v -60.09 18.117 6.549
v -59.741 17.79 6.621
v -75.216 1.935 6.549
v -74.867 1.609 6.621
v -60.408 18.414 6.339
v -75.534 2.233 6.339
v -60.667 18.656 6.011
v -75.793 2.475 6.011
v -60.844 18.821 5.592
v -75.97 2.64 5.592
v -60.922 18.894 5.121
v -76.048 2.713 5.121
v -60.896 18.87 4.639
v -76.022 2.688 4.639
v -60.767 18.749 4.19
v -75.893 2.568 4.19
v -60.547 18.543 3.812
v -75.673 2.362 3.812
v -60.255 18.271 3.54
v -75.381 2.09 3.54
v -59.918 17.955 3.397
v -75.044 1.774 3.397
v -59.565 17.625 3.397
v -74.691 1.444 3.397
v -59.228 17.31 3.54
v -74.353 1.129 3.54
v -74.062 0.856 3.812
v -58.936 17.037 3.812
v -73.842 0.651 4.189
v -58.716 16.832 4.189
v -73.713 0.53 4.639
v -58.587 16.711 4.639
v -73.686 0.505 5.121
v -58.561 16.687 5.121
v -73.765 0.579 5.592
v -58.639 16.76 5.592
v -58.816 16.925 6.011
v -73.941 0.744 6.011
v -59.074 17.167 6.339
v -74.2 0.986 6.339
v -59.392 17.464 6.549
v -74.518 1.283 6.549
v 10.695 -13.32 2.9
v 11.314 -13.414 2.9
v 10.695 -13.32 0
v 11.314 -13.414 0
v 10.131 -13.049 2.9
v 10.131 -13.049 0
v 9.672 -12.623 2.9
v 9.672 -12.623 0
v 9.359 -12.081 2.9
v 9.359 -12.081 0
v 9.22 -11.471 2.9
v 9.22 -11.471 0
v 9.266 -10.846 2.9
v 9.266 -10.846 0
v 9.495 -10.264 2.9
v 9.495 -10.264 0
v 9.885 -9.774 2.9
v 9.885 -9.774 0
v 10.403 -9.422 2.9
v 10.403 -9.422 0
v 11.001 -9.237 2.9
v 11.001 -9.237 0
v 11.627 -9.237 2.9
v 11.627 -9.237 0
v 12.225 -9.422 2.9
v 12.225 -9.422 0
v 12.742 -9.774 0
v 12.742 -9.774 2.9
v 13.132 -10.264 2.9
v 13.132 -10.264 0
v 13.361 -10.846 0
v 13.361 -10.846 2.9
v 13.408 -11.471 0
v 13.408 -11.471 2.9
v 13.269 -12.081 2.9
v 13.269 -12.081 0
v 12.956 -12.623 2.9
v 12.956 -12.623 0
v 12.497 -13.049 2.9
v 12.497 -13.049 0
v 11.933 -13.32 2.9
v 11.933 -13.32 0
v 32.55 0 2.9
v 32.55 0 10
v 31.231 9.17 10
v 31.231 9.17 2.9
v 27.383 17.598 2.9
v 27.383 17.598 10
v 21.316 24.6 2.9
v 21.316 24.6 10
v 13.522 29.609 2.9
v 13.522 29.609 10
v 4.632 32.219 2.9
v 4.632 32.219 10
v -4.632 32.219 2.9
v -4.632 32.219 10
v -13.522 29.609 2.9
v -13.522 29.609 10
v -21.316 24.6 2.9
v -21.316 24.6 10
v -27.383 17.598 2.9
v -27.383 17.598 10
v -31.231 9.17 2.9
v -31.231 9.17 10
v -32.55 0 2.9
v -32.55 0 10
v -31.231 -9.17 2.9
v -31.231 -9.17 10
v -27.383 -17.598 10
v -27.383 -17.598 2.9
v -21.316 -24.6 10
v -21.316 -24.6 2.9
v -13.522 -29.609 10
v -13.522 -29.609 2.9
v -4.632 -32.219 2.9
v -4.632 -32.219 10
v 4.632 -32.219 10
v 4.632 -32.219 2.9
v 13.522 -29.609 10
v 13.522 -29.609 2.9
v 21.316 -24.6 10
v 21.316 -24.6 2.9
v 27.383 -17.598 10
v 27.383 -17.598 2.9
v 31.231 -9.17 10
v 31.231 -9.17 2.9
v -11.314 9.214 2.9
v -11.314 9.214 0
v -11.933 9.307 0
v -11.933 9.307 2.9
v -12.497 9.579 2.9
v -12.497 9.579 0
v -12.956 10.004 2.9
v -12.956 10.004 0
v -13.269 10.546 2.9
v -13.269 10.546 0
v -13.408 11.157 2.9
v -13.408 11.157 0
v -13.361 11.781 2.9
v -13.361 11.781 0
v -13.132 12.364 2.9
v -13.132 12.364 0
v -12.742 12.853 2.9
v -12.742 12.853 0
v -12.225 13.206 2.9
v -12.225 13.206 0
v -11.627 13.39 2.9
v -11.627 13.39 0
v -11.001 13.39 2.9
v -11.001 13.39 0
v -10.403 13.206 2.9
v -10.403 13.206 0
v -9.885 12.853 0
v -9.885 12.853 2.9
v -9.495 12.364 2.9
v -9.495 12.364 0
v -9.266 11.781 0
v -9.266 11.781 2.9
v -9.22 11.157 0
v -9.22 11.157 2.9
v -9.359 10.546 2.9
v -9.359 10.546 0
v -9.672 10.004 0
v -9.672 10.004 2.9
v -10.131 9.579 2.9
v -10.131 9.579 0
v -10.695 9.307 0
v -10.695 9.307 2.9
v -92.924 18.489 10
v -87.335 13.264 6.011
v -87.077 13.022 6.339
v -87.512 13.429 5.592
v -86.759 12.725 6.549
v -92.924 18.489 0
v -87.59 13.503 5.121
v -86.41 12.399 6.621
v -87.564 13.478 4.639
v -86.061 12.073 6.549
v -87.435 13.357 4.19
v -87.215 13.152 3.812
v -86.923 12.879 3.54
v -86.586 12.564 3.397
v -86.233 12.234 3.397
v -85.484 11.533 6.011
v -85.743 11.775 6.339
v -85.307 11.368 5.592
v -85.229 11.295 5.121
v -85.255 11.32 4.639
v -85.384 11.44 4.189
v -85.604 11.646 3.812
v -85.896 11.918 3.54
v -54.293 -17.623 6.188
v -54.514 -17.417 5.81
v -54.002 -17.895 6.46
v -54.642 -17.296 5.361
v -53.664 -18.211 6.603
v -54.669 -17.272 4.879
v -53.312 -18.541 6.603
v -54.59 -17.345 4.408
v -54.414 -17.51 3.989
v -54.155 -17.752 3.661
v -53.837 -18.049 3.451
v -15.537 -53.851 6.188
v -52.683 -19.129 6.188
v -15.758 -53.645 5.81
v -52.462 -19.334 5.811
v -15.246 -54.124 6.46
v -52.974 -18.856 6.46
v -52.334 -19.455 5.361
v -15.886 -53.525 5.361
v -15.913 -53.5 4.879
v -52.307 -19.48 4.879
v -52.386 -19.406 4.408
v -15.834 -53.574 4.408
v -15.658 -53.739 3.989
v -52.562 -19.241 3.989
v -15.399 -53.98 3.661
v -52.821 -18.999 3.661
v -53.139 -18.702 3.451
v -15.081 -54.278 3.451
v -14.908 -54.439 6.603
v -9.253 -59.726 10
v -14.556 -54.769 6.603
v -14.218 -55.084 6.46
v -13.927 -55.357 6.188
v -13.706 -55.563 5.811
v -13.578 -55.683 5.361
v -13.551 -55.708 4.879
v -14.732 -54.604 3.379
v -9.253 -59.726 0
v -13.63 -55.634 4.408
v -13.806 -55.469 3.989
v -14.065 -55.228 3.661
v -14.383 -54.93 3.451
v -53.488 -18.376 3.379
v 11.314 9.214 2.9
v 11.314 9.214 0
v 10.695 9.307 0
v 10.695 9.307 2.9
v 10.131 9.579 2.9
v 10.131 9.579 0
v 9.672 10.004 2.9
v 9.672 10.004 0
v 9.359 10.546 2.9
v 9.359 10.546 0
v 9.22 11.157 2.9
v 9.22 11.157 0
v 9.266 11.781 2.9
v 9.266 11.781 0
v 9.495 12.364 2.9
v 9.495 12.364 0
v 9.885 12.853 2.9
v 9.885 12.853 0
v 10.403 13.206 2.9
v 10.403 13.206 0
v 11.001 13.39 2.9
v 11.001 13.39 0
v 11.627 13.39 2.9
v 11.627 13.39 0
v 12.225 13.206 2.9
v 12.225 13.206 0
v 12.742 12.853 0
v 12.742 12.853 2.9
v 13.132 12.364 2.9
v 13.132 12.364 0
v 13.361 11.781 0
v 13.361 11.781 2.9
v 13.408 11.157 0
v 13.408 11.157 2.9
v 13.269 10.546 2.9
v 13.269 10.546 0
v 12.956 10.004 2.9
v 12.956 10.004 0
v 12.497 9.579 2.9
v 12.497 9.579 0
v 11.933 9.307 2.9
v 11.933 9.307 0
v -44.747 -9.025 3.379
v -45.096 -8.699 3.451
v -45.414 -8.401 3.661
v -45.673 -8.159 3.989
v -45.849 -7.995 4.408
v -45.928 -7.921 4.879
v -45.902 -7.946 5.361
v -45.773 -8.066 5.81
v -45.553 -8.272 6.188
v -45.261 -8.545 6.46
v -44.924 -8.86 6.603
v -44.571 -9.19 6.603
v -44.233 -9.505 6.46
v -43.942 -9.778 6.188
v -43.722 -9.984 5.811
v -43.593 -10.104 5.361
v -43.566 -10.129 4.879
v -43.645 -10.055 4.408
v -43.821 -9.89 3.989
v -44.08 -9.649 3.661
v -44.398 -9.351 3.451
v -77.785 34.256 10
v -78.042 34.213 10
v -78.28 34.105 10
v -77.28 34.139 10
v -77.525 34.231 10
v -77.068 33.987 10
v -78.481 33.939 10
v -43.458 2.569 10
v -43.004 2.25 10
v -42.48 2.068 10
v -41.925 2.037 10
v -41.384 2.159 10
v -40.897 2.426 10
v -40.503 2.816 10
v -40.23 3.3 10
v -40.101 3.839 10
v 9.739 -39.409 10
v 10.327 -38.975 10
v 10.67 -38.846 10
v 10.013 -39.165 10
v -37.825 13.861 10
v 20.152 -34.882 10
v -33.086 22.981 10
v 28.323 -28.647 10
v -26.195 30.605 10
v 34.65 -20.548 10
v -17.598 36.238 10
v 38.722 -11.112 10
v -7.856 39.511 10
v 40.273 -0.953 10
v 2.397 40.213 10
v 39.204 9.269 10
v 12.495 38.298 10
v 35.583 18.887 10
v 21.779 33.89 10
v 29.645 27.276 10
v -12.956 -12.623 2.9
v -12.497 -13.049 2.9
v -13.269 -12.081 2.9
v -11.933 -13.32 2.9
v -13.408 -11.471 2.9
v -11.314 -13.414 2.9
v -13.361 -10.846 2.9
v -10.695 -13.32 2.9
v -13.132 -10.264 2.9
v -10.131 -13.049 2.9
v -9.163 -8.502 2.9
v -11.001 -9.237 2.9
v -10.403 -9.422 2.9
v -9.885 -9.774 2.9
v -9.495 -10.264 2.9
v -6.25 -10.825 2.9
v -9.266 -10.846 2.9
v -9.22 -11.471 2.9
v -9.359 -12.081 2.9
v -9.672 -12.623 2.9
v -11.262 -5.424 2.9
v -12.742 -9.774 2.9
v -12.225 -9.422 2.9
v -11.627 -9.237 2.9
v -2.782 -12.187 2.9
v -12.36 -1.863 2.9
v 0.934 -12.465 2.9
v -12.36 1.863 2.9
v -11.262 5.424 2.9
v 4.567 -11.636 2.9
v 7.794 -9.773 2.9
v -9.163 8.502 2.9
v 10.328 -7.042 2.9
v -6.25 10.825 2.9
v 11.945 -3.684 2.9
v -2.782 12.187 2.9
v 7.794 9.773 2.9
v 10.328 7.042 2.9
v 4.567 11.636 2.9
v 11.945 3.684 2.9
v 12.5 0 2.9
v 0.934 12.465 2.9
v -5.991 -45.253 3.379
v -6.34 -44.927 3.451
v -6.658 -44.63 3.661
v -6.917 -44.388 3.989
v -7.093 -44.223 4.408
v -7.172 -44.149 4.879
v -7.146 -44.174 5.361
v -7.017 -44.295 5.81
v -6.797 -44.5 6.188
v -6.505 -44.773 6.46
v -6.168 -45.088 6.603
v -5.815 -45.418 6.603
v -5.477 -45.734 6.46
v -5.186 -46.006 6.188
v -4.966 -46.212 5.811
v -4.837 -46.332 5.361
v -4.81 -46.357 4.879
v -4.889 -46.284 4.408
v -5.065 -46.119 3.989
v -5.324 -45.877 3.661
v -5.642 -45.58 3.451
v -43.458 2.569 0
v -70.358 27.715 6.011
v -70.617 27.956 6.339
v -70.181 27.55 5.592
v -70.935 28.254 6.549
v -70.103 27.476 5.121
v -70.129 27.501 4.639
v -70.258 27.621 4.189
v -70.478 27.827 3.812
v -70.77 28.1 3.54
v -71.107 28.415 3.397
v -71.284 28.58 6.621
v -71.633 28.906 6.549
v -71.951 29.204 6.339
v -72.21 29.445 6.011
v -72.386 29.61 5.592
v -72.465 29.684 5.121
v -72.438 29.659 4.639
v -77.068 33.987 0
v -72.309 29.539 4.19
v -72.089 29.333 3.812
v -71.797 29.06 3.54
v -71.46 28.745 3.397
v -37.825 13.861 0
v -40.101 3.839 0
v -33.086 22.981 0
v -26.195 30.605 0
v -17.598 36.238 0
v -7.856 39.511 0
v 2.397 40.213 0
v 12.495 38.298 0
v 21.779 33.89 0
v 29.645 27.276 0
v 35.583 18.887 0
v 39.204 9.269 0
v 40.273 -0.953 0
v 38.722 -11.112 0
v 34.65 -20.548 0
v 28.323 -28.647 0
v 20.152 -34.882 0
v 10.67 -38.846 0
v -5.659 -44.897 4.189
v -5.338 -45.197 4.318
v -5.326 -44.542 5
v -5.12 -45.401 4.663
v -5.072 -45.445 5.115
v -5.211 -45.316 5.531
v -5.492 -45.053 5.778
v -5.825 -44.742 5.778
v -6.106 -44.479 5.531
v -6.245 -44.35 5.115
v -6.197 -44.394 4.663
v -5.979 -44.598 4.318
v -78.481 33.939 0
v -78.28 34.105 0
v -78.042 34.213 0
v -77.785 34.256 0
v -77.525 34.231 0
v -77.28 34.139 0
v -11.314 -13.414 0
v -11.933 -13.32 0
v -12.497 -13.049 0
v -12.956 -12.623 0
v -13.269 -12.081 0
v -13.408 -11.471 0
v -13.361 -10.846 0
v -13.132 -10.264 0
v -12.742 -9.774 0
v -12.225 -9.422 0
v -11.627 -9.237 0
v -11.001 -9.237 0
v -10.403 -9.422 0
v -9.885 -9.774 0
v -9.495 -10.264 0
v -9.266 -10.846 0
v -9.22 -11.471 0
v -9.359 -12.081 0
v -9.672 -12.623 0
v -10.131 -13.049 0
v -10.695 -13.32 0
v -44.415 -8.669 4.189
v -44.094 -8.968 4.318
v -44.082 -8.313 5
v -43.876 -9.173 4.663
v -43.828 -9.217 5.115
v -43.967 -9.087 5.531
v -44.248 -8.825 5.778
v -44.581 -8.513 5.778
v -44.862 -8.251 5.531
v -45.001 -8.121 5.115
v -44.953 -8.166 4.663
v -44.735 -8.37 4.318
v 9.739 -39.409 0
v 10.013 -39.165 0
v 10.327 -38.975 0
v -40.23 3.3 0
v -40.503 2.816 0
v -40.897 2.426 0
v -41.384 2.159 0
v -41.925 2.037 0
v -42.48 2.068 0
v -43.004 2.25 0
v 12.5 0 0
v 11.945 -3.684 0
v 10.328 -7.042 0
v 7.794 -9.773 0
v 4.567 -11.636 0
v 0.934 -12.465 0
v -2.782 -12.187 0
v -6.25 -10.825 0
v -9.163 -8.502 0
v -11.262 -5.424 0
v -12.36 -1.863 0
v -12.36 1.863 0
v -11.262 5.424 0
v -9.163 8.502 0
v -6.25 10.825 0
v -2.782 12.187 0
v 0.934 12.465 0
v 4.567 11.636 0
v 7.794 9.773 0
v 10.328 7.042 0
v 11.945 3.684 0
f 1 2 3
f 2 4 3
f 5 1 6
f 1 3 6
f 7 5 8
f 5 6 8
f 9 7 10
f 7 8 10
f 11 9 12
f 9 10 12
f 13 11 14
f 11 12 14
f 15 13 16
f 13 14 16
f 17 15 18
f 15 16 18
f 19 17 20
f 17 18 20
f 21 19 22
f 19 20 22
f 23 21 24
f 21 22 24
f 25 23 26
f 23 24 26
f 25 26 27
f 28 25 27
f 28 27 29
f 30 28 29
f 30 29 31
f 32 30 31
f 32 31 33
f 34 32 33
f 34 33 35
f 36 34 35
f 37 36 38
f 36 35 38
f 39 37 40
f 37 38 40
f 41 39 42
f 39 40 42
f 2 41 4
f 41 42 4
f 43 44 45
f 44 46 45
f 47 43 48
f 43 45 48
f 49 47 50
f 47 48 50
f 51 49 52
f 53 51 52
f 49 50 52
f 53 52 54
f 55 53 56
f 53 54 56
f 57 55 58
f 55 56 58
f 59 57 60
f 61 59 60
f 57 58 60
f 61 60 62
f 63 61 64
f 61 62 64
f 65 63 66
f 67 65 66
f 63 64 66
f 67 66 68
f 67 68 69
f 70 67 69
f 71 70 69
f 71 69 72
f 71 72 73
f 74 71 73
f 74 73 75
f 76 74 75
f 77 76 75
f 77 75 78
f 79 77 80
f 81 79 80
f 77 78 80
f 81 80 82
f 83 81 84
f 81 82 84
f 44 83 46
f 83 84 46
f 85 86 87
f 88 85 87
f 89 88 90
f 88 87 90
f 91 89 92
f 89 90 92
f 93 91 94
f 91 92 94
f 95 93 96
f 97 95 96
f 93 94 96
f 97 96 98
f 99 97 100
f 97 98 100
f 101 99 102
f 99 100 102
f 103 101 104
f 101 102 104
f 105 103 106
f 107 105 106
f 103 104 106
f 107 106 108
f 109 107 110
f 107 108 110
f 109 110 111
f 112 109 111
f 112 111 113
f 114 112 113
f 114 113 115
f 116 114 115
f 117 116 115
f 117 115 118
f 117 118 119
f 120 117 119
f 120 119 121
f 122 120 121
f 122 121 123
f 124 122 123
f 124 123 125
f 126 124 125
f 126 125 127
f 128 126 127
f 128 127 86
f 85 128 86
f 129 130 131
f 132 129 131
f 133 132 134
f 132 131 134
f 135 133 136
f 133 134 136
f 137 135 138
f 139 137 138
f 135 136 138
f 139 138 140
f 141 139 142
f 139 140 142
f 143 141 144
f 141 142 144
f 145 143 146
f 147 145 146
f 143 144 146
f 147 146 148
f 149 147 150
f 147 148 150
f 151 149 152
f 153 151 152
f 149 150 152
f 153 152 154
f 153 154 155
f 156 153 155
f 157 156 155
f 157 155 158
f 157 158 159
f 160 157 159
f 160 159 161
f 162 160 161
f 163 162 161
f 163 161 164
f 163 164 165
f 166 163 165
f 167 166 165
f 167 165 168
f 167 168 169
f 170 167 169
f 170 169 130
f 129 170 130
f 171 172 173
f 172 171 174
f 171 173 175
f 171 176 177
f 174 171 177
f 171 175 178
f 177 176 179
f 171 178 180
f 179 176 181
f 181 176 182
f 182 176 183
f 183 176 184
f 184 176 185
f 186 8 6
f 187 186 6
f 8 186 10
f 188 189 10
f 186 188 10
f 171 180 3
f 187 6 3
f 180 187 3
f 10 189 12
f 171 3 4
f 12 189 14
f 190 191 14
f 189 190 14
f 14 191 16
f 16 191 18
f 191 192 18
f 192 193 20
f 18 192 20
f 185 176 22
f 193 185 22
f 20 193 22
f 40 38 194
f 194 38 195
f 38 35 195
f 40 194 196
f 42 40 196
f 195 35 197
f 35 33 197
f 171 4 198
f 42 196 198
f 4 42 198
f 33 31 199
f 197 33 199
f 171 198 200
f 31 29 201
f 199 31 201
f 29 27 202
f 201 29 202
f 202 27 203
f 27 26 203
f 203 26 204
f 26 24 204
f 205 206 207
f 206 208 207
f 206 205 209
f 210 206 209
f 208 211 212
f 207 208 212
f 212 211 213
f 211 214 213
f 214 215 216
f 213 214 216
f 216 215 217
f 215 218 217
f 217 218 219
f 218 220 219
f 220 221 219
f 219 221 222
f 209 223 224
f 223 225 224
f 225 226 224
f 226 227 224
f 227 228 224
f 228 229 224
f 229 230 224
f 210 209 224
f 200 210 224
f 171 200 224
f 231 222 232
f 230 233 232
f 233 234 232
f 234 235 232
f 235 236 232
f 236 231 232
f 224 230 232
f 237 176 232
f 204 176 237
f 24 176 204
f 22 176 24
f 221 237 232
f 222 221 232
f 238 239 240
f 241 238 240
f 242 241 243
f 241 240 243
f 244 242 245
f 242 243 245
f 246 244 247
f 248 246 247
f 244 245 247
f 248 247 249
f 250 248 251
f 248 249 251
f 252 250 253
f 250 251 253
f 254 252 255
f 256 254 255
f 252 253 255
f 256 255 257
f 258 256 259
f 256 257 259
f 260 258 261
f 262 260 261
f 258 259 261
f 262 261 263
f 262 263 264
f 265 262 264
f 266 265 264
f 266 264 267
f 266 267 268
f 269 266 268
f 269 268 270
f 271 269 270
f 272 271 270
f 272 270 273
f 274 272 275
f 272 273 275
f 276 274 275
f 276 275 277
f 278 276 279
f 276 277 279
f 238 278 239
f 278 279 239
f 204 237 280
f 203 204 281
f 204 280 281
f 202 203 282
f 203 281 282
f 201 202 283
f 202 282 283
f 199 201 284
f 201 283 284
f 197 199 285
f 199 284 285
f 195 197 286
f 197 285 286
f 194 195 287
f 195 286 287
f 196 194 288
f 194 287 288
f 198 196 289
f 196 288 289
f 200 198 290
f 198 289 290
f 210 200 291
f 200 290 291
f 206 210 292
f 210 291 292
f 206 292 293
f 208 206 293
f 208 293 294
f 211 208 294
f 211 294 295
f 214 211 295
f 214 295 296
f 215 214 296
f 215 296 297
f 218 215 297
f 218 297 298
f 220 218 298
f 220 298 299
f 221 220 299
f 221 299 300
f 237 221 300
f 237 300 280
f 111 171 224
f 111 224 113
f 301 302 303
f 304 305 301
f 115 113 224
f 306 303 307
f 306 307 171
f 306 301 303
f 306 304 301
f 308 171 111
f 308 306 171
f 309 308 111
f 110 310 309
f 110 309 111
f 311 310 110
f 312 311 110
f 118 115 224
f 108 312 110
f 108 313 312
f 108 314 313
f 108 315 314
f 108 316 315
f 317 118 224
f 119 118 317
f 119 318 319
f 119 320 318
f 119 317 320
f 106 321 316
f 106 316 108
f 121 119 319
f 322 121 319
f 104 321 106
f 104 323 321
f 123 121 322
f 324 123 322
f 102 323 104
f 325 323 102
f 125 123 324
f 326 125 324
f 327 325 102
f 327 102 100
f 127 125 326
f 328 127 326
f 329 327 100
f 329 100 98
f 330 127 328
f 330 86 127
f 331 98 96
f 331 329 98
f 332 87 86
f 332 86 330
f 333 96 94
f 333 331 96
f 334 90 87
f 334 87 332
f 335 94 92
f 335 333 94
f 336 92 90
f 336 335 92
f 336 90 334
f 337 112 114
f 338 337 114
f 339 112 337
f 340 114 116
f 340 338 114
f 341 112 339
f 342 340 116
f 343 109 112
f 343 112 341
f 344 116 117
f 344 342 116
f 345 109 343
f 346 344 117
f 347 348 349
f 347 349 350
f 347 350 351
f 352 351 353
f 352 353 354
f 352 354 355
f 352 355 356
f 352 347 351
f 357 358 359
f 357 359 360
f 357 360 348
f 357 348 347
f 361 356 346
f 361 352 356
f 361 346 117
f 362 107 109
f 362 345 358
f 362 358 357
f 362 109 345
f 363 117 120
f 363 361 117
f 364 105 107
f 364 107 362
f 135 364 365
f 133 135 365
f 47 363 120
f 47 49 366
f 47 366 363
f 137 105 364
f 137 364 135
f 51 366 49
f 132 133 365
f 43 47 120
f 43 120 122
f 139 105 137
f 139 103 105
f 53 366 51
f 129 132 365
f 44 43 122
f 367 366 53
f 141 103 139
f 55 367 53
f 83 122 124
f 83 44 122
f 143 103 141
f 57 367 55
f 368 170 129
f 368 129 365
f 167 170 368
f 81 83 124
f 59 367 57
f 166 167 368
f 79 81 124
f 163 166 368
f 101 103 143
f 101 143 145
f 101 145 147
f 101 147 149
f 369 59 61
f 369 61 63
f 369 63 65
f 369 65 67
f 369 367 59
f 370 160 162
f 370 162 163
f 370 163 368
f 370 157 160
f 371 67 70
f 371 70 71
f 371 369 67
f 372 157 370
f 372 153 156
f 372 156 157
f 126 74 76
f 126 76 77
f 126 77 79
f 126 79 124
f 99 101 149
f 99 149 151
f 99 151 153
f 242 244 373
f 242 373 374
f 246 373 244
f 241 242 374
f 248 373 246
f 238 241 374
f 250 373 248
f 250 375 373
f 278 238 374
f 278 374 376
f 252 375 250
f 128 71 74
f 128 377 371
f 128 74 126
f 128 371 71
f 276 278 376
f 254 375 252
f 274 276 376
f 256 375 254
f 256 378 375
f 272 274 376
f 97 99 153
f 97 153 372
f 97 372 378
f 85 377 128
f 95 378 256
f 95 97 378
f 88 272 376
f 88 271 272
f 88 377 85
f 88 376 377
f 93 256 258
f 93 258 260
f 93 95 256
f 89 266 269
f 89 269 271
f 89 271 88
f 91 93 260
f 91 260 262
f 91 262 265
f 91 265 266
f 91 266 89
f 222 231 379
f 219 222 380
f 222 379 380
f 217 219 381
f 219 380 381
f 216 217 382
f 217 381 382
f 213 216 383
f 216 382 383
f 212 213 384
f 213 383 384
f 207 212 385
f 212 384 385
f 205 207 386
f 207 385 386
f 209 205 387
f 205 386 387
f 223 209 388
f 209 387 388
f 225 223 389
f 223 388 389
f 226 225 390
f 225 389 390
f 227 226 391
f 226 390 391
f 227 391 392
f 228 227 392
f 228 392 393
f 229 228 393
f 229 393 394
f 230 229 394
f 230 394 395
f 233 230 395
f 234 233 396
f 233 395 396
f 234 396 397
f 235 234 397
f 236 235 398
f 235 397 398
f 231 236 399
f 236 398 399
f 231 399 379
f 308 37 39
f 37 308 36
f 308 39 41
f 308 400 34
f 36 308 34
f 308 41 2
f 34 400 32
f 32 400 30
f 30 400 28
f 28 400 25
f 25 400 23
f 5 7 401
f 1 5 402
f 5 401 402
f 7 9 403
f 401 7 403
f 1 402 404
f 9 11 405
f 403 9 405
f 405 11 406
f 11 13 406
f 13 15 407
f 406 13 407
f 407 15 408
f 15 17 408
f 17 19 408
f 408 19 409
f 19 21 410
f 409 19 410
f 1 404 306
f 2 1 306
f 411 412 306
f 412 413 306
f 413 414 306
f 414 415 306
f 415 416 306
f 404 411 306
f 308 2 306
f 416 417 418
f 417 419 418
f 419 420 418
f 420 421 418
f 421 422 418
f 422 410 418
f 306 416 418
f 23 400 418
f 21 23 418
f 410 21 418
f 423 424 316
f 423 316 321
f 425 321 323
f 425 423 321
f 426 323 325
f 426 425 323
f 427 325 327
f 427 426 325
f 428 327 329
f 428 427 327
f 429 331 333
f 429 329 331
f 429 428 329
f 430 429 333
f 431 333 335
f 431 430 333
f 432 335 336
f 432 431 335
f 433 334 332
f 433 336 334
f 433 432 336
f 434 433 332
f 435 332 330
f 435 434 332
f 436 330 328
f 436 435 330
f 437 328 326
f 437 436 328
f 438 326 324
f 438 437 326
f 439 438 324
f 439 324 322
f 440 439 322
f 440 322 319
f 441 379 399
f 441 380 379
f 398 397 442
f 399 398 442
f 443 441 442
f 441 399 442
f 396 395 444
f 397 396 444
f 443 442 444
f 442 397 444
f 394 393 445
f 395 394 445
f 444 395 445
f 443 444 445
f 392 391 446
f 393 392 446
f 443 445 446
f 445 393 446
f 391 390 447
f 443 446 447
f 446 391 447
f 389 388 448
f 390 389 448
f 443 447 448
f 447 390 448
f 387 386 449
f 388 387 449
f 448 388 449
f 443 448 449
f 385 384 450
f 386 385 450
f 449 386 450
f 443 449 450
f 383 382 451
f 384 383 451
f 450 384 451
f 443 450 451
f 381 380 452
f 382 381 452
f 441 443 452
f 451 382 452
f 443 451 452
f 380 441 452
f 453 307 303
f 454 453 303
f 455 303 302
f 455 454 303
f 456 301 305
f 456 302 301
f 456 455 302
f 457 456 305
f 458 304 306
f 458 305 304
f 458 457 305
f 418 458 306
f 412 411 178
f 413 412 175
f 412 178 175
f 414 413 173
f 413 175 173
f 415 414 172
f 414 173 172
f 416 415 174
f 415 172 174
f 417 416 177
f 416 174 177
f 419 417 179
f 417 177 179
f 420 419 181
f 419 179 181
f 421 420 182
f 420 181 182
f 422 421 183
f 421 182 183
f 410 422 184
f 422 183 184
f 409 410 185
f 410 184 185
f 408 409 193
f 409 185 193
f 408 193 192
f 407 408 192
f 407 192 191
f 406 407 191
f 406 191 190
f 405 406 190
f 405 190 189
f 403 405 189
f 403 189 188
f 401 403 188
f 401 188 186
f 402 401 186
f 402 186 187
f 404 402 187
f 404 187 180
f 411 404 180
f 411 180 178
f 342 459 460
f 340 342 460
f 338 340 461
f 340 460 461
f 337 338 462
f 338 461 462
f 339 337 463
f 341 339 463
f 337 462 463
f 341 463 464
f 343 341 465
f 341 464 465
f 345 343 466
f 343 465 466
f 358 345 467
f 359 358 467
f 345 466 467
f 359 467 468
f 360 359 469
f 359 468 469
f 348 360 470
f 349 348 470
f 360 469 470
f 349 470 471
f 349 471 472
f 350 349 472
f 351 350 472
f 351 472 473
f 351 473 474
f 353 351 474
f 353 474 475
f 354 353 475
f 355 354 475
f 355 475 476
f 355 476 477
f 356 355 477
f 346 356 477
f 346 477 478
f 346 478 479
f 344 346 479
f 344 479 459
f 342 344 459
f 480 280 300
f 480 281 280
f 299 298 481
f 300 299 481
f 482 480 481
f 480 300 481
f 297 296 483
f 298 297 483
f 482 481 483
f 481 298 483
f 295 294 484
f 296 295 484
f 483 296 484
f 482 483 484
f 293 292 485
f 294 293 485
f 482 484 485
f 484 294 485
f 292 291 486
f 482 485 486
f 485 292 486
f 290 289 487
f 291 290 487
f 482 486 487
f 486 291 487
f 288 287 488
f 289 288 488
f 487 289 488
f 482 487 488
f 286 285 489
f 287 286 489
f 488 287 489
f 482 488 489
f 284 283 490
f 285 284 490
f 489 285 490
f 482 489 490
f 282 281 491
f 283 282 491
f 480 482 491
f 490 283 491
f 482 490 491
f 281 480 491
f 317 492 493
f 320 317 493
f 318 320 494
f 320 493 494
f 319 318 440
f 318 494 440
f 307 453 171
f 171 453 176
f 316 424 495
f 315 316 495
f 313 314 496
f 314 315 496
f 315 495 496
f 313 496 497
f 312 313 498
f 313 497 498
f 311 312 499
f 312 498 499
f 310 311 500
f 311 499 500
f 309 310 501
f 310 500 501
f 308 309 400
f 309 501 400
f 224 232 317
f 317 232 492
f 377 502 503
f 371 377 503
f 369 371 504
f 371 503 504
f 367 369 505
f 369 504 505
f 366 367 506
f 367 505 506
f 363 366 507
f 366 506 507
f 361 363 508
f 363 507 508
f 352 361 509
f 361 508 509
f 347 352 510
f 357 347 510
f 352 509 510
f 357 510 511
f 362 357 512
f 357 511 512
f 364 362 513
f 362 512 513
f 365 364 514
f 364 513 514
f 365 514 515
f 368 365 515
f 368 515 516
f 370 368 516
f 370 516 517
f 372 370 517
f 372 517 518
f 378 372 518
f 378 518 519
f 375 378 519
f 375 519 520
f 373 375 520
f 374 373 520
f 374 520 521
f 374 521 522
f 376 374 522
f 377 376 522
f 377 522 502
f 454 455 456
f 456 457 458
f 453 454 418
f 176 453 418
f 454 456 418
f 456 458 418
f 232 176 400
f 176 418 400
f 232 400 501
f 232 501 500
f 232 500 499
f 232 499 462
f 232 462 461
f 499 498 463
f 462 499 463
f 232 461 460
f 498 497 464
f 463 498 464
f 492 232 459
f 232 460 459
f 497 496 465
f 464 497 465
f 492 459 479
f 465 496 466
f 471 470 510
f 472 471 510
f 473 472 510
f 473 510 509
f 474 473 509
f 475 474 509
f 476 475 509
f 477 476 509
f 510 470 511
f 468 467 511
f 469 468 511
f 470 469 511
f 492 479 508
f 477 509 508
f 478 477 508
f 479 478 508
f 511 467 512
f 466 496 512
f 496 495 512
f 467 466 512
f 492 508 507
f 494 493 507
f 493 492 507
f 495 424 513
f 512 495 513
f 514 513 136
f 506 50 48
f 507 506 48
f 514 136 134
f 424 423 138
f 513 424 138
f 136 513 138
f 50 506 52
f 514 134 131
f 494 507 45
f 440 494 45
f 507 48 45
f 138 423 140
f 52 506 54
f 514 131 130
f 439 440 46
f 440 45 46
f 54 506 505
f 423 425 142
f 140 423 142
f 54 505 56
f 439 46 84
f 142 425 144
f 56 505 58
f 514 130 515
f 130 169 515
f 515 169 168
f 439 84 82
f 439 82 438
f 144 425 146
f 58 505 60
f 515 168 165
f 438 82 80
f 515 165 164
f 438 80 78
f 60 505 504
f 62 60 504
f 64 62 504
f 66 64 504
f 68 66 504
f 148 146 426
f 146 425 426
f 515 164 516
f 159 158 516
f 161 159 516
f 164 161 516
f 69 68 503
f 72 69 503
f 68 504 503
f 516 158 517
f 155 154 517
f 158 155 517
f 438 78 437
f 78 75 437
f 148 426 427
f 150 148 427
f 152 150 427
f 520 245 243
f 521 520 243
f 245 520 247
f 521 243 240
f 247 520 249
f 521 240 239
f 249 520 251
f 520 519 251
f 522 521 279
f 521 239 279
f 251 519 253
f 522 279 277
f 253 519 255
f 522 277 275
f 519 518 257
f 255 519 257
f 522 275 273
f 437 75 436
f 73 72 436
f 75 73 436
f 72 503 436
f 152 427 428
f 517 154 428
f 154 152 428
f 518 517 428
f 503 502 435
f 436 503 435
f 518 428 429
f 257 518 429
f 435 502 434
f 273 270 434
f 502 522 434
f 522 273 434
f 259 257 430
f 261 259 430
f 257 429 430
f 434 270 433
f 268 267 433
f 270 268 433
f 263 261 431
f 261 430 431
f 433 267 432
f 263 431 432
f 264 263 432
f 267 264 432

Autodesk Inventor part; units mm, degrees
ref_plane "YZ Plane" through (0, 0, 0) normal (1, 0, 0) x (0, 1, 0)
ref_plane "XZ Plane" through (0, 0, 0) normal (0, 1, 0) x (-1, 0, 0)
ref_plane "Work Plane1" through (0, 0, 0) normal (0, 0, 1) x (1, 0, 0)
sketch "Sketch1" plane through (0, 0, 0) normal (0, 0, 1) x (1, 0, 0)
  arc A0 (-77.068, 33.987) -> (-78.4814, 33.9394) centre (-77.7509, 33.2565) ccw projected
  line L0 (-78.4814, 33.9394) -> (-92.9244, 18.4887) projected
  line L1 (-92.9244, 18.4887) -> (-9.2531, -59.7257) projected
  line L2 (-9.2531, -59.7257) -> (9.7389, -39.4086) projected
  arc A1 (10.6702, -38.8458) -> (9.7389, -39.4086) centre (11.2, -40.7744) ccw projected
  arc A2 (10.6702, -38.8458) -> (-40.1013, 3.8394) centre (0, 0) ccw projected
  line L3 (-43.4579, 2.5689) -> (-77.068, 33.987) projected
  circle A3 centre (33.3141, 1.123) radius 2.5 projected
  circle A4 centre (1.123, -33.3141) radius 2.5 projected
  circle A5 centre (0, 0) radius 21 projected
  circle A6 centre (-1.123, 33.3141) radius 2.5 projected
  circle A7 centre (-33.3141, -1.123) radius 2.5 projected
  circle A8 centre (0, 0) radius 12.5 projected
  circle A9 centre (0, -16) radius 2 projected
  circle A10 centre (0, 16) radius 2 projected
  circle A11 centre (-16, 0) radius 2 projected
  circle A12 centre (16, 0) radius 2 projected
  circle A13 centre (11.3137, 11.3137) radius 1.6 projected
  circle A14 centre (-11.3137, -11.3137) radius 1.6 projected
  circle A15 centre (-11.3137, 11.3137) radius 1.6 projected
  circle A16 centre (11.3137, -11.3137) radius 1.6 projected
  circle A17 centre (0, 0) radius 20.7 projected
  circle A18 centre (0, 0) radius 40.2846
  line L4 (31.6375, -97.9493) -> (-99.8575, 24.9697) projected
  arc A19 (-43.4579, 2.5689) -> (-40.1013, 3.8394) centre (-42.0921, 4.03) ccw projected
  point P0 (0, 0)
  point P1 (-45.0314, -26.2807)
  point P2 (-23.1886, -46.699)
  point P3 (0, 0)
  point P4 (10.6702, -38.8458)
  point P5 (-40.1013, 3.8394)
  point P6 (0, 0)
extrude "Extrusion1" add sketch "Sketch1" along normal blind 10 contours L3 A19 A18 A1 L2 L1 L0 A0 | A2 A18 | A3 | A4 | A5 | A6 | A7 | A9 | A10 | A11 | A12 | A13 | A14 | A15 | A16 | A17
sketch "Sketch2" plane through (-77.068, 33.987, 10) normal (0.6828833, 0.7305275, 0) x (0.7305275, -0.6828833, 0)
  arc A0 (36.818, 70.5) -> (34.818, 72.5) centre (34.818, 70.5) ccw projected
  line L0 (-3.182, 72.5) -> (34.818, 72.5) projected
  arc A1 (-3.182, 72.5) -> (-5.182, 70.5) centre (-3.182, 70.5) ccw projected
  line L1 (-5.182, 2) -> (-5.182, 70.5) projected
  arc A2 (-5.182, 2) -> (-3.182, 0) centre (-3.182, 2) ccw projected
  line L2 (34.818, 0) -> (-3.182, 0) projected
  arc A3 (34.818, 0) -> (36.818, 2) centre (34.818, 2) ccw projected
  line L3 (36.818, 70.5) -> (36.818, 2) projected
  circle A4 centre (15.818, 36.25) radius 12.6 projected
  circle A5 centre (31.818, 36.25) radius 2 projected
  arc A6 (31.218, 2.9) -> (31.218, 7.1) centre (31.218, 5) ccw projected
  line L4 (0.418, 2.9) -> (31.218, 2.9) projected
  arc A7 (0.418, 7.1) -> (0.418, 2.9) centre (0.418, 5) ccw projected
  line L5 (31.218, 7.1) -> (0.418, 7.1) projected
  circle A8 centre (15.818, 20.25) radius 2 projected
  arc A9 (0.418, 69.6) -> (0.418, 65.4) centre (0.418, 67.5) ccw projected
  line L6 (31.218, 69.6) -> (0.418, 69.6) projected
  arc A10 (31.218, 65.4) -> (31.218, 69.6) centre (31.218, 67.5) ccw projected
  line L7 (0.418, 65.4) -> (31.218, 65.4) projected
  circle A11 centre (15.818, 52.25) radius 2 projected
  circle A12 centre (-0.182, 36.25) radius 2 projected
  circle A13 centre (7.918, 67.5) radius 1.5706 projected
  circle A14 centre (23.718, 67.5) radius 1.5706 projected
  circle A15 centre (28.5459, 23.5221) radius 2 projected
  circle A16 centre (3.09, 23.5221) radius 2 projected
  circle A17 centre (3.09, 48.9779) radius 2 projected
  circle A18 centre (28.5459, 48.9779) radius 2 projected
  point P0 (79.5095, 10)
  point P1 (7.918, 5)
  point P2 (23.718, 5)
hole "Hole1" at (-71.2837, 28.58, 5) at (-59.7414, 17.7904, 5) direction (-0.6828833, -0.7305275, 0) diameter 3.242 end through all thread size "M4x0.7" class "6H" standard "ISO Metric profile"
sketch "Sketch9" plane through (0, 0, 10) normal (0, 0, 1) x (1, 0, 0)
  circle A0 centre (0, 0) radius 32.55
  dimension "d44" = 65.1
extrude "Extrusion4" cut sketch "Sketch9" against normal blind 7.1
sketch "Sketch11" plane through (-9.2531, -59.7257, 0) normal (-0.6828833, -0.7305275, 0) x (0.7305275, -0.6828833, 0)
  circle A0 centre (-60.5521, 5) radius 2.25 projected
  circle A1 centre (-7.5, 5) radius 2.25 projected
  point P0 (-34.026, 0)
hole "Hole7" at (-53.488, -18.3757, 5) at (-14.732, -54.604, 5) direction (0.6828833, 0.7305275, 0) diameter 3.242 depth 12.8 tip angle 118 thread size "M4x0.7" class "6H" standard "ISO Metric profile"
sketch "Sketch12" plane through (0, 0, 2.9) normal (0, 0, 1) x (1, 0, 0)
  circle A0 centre (0, 0) radius 12.5 projected
  circle A1 centre (0, -18) radius 2 projected
  circle A2 centre (0, 18) radius 2 projected
  circle A3 centre (-18, 0) radius 2 projected
  circle A4 centre (18, 0) radius 2 projected
  circle A5 centre (11.3137, 11.3137) radius 1.6 projected
  circle A6 centre (-11.3137, -11.3137) radius 1.6 projected
  circle A7 centre (-11.3137, 11.3137) radius 1.6 projected
  circle A8 centre (11.3137, -11.3137) radius 1.6 projected
  circle A9 centre (0, 0) radius 20.7 projected
  point P0 (0, 0)
hole "Hole8" at (11.3137, 11.3137, 2.9) at (-11.3137, 11.3137, 2.9) at (-11.3137, -11.3137, 2.9) at (11.3137, -11.3137, 2.9) direction (0, 0, -1) diameter 4.2 depth 12.8 tip angle 118 clearance for "Countersunk Flat Head Screw ISO 2009/7046" size "M4" standard "ISO"
properties part number "base frame voorkant 10 mm" material "Aluminum 6061"
